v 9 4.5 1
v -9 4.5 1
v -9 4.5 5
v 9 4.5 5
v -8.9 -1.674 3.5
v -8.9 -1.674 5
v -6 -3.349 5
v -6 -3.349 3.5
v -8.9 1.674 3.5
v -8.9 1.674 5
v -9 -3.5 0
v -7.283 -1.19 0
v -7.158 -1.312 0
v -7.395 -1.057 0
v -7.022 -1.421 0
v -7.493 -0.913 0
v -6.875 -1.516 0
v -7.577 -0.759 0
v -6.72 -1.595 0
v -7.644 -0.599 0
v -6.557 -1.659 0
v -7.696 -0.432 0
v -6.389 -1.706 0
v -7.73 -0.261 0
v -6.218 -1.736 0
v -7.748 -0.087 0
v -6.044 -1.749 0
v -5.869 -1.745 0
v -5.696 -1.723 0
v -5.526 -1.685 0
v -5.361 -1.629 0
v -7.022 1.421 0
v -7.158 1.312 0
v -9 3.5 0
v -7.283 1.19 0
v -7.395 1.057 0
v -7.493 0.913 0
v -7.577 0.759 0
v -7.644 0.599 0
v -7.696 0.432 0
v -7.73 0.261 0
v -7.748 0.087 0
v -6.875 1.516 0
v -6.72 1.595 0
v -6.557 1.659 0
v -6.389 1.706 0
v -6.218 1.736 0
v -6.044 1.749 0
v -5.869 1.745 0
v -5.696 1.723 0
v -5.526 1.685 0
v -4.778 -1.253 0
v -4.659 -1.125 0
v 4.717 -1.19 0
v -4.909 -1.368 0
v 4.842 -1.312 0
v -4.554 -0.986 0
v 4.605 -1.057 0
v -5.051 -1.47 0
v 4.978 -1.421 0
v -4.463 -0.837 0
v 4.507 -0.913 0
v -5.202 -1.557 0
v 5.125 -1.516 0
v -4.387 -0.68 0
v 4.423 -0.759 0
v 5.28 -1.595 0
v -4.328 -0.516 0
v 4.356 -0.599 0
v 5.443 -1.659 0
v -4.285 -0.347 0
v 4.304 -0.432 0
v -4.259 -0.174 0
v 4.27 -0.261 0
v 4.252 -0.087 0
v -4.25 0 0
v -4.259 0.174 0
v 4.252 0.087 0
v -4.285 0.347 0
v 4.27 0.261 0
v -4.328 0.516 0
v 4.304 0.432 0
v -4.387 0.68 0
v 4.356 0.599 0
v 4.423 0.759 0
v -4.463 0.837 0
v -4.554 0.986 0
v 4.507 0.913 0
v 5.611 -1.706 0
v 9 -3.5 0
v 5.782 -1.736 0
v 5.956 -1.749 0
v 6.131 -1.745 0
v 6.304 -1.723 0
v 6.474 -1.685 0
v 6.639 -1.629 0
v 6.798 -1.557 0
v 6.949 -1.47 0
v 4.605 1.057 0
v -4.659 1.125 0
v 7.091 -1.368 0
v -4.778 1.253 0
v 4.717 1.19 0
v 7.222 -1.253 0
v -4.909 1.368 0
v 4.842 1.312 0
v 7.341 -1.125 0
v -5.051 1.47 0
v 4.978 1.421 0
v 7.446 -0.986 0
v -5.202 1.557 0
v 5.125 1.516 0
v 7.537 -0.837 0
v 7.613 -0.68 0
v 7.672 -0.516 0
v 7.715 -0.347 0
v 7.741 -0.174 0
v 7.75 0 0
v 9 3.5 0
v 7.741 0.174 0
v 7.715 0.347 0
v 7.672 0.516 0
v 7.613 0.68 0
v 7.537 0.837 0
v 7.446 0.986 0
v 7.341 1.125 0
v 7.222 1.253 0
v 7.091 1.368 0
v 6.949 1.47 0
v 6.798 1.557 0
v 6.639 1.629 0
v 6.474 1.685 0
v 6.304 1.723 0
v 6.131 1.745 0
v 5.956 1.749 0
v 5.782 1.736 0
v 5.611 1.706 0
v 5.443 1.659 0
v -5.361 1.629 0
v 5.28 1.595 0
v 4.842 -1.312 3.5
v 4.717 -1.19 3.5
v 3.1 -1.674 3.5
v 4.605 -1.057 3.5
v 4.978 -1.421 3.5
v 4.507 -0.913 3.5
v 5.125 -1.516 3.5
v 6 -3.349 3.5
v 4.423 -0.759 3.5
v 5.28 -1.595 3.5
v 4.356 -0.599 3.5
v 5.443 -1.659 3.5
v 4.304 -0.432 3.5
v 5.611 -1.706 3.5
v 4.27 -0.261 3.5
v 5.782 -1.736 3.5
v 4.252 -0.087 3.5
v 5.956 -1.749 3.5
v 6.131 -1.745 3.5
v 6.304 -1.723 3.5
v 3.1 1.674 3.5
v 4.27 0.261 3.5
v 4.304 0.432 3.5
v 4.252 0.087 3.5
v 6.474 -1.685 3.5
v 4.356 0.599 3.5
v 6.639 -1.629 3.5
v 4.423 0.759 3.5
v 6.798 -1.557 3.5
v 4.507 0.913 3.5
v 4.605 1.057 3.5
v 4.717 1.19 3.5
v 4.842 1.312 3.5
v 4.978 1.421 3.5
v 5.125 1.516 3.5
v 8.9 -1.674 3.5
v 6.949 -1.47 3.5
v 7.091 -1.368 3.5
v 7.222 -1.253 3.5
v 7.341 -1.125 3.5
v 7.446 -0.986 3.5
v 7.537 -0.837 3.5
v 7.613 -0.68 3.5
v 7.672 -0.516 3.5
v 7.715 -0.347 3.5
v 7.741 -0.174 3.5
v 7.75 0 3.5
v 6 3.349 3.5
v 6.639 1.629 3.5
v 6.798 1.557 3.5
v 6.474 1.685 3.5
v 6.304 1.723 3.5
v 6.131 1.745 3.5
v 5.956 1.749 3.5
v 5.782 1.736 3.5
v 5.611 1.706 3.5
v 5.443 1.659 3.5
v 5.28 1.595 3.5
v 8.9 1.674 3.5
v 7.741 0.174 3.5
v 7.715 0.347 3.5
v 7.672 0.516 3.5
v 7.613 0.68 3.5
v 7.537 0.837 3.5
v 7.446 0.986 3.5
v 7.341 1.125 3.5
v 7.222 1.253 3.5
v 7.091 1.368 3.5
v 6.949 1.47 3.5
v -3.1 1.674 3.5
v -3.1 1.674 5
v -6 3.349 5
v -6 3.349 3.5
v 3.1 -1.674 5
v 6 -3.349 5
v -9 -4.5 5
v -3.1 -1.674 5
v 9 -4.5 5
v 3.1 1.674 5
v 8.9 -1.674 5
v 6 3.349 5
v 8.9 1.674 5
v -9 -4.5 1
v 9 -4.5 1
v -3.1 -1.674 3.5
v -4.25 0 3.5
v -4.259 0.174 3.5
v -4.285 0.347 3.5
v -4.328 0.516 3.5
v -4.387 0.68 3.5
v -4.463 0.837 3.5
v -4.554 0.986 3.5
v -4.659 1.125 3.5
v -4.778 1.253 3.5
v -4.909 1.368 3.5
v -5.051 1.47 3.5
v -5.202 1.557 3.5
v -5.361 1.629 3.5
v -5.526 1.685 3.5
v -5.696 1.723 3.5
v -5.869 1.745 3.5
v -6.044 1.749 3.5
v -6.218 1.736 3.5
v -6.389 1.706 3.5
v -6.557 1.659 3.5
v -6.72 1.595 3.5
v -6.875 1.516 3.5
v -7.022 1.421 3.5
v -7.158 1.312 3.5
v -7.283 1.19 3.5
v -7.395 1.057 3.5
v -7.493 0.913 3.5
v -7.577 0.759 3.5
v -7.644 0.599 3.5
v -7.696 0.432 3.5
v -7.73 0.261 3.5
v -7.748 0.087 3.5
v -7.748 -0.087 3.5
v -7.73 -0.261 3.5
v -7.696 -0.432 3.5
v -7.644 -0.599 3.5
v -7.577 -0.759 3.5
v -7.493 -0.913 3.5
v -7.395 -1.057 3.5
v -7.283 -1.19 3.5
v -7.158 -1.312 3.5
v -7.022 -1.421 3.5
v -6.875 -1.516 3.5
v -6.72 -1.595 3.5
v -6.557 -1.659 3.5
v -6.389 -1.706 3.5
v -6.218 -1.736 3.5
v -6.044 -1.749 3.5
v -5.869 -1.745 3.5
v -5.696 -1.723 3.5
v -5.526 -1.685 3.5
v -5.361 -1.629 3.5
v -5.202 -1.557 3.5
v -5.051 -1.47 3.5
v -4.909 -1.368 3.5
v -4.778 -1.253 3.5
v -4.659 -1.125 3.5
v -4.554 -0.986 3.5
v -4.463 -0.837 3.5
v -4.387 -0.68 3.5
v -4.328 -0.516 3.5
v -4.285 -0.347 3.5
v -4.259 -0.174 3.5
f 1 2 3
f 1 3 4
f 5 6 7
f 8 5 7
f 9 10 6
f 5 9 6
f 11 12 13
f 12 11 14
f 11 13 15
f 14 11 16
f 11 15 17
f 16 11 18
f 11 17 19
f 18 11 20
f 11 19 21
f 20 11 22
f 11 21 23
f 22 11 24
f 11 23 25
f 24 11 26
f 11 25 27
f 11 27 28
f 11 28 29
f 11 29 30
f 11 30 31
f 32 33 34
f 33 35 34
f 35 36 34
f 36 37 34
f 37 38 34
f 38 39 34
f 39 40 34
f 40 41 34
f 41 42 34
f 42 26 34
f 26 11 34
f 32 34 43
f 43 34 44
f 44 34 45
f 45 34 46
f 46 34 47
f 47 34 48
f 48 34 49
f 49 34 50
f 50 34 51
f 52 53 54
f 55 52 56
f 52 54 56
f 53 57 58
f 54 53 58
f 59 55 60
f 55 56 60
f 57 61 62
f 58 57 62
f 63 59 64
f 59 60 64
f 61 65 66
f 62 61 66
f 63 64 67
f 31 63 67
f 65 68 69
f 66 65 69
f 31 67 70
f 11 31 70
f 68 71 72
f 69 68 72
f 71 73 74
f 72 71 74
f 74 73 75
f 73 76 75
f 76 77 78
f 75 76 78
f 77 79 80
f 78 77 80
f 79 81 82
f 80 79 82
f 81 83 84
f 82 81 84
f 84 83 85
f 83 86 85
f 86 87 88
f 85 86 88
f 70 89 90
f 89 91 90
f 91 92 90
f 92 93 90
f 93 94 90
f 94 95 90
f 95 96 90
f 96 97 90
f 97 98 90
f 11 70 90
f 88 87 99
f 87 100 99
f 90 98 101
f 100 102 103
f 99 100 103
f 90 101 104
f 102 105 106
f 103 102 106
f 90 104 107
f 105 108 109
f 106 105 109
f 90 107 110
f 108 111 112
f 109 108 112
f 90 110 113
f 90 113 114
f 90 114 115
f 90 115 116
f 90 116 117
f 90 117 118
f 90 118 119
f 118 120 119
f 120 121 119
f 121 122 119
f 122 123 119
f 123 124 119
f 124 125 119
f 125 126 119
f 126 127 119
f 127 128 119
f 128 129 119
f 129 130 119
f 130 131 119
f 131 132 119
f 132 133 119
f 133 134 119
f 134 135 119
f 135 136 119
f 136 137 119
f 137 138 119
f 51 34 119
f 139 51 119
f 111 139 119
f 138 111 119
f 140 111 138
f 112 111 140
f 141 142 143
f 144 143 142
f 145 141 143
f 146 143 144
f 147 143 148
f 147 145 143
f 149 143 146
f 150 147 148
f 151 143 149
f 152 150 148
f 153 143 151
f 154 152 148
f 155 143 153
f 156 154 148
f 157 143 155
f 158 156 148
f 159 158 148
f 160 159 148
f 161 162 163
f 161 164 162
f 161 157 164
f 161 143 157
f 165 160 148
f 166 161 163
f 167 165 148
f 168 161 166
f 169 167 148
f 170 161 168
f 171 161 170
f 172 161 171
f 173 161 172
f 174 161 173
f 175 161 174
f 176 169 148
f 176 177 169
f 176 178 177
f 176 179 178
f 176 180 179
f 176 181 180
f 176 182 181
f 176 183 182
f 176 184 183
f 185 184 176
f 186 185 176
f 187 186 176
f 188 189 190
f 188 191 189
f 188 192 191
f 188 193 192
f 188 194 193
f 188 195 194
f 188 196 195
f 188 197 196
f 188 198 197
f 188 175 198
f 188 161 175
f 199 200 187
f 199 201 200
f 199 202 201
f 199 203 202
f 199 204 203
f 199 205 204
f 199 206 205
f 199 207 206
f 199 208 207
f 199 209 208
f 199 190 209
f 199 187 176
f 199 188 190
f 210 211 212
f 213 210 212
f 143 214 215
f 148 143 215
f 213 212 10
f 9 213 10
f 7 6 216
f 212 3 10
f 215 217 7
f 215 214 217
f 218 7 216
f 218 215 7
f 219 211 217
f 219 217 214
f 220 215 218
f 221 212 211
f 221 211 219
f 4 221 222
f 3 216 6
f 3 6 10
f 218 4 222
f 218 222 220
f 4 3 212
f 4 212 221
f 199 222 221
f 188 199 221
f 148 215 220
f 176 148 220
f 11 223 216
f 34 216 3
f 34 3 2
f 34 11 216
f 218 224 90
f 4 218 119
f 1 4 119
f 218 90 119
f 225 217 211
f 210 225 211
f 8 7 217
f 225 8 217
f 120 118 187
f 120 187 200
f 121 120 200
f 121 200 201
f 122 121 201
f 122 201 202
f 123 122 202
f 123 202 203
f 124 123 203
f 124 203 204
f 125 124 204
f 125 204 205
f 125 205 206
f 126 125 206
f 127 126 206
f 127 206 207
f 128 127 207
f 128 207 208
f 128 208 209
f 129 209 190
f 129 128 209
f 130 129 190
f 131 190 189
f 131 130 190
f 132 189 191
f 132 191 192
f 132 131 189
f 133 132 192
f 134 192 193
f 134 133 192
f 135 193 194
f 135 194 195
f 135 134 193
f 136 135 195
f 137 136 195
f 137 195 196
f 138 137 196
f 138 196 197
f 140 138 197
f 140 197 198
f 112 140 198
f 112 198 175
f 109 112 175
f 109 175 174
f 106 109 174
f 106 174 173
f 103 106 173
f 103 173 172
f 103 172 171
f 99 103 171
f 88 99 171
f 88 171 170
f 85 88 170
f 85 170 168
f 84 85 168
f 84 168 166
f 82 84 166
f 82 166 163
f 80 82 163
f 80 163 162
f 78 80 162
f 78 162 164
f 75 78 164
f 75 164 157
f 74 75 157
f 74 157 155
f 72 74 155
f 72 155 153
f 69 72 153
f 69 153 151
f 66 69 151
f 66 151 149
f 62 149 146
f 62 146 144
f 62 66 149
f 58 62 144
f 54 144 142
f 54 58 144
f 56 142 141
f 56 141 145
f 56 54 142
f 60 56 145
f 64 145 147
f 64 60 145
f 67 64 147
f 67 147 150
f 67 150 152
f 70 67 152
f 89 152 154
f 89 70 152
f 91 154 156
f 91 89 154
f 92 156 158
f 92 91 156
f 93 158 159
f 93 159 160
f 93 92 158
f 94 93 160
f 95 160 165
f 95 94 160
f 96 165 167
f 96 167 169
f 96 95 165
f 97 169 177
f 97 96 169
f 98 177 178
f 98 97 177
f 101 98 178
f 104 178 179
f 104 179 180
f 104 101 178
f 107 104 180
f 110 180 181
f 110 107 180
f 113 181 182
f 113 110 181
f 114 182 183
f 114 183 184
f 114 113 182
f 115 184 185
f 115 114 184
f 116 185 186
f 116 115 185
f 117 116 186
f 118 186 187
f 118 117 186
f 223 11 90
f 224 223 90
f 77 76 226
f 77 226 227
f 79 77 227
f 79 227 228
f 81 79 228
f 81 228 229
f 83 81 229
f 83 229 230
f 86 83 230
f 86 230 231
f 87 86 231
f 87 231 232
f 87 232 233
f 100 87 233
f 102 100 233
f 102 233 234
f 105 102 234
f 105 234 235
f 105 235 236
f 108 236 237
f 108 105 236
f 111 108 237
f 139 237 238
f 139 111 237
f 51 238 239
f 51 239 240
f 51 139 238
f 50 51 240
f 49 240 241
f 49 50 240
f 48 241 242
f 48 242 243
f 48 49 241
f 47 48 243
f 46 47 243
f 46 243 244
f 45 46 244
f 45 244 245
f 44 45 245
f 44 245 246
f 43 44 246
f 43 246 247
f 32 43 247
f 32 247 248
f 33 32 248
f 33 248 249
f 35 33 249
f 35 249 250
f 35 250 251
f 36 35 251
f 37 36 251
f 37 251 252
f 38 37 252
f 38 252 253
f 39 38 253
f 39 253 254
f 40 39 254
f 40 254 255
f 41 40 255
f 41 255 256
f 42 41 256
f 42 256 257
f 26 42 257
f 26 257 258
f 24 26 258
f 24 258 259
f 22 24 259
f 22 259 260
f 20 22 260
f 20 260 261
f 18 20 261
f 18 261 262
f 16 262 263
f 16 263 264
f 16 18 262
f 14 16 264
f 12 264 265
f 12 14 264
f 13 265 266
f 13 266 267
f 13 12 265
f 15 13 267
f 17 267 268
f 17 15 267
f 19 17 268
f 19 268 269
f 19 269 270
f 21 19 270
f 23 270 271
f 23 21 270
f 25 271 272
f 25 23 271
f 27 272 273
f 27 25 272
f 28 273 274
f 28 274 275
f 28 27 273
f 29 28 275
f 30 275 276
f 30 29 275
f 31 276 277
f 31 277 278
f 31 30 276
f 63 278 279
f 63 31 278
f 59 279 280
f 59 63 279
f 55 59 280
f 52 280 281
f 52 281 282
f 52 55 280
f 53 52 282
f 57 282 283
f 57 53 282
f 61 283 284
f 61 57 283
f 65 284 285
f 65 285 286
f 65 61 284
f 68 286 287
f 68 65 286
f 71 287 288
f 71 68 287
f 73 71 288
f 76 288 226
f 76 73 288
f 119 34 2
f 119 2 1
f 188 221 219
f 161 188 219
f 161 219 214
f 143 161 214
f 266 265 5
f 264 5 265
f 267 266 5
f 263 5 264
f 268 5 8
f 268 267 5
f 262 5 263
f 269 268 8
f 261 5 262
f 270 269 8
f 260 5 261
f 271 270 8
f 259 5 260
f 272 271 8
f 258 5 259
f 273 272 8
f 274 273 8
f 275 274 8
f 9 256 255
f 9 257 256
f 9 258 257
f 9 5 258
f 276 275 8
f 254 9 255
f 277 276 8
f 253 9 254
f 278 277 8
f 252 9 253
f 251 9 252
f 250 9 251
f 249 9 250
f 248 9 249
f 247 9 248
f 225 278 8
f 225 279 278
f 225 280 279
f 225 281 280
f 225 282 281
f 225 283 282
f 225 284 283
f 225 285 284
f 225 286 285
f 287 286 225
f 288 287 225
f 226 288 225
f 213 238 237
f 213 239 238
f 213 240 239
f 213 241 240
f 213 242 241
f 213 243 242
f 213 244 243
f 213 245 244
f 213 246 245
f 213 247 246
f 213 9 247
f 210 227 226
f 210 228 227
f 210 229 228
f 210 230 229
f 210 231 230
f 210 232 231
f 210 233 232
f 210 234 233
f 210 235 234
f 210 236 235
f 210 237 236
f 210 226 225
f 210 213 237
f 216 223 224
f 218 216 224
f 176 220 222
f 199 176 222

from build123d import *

# Parameters (mm, degrees)
F0_W     = 18
F0_H     = 9
F0_R     = 1.75
F1_DEPTH = 5
F2_R     = 1.75
F3_DEPTH = 1.5
F4_SIZE  = 1


with BuildPart() as f1:
    # F0 (on Top) → F1 (new body)
    with BuildSketch(Plane.XY):
        Rectangle(F0_W, F0_H)
        with Locations((-6, 0)):
            Circle(F0_R, mode=Mode.SUBTRACT)
        with Locations((6, 0)):
            Circle(F0_R, mode=Mode.SUBTRACT)
    extrude(amount=F1_DEPTH)

    # F2 (on face) → F3 (cut)
    with BuildSketch(Plane.XY.offset(5)):
        Polygon((-8.9, 1.674316), (-8.9, -1.674316), (-6, -3.348632), (-3.1, -1.674316), (-3.1, 1.674316), (-6, 3.348632), align=None)
        with Locations((-6, 0)):
            Circle(F2_R, mode=Mode.SUBTRACT)
        Polygon((3.1, 1.674316), (3.1, -1.674316), (6, -3.348632), (8.9, -1.674316), (8.9, 1.674316), (6, 3.348632), align=None)
        with Locations((6, 0)):
            Circle(F2_R, mode=Mode.SUBTRACT)
    extrude(amount=-F3_DEPTH, mode=Mode.SUBTRACT)

    # F4
    f4_edges = [f1.edges().sort_by_distance(p)[0] for p in [
        (0, -4.5, 0),
        (0, 4.5, 0),
    ]]
    chamfer(f4_edges, length=F4_SIZE)


solid = f1.part
